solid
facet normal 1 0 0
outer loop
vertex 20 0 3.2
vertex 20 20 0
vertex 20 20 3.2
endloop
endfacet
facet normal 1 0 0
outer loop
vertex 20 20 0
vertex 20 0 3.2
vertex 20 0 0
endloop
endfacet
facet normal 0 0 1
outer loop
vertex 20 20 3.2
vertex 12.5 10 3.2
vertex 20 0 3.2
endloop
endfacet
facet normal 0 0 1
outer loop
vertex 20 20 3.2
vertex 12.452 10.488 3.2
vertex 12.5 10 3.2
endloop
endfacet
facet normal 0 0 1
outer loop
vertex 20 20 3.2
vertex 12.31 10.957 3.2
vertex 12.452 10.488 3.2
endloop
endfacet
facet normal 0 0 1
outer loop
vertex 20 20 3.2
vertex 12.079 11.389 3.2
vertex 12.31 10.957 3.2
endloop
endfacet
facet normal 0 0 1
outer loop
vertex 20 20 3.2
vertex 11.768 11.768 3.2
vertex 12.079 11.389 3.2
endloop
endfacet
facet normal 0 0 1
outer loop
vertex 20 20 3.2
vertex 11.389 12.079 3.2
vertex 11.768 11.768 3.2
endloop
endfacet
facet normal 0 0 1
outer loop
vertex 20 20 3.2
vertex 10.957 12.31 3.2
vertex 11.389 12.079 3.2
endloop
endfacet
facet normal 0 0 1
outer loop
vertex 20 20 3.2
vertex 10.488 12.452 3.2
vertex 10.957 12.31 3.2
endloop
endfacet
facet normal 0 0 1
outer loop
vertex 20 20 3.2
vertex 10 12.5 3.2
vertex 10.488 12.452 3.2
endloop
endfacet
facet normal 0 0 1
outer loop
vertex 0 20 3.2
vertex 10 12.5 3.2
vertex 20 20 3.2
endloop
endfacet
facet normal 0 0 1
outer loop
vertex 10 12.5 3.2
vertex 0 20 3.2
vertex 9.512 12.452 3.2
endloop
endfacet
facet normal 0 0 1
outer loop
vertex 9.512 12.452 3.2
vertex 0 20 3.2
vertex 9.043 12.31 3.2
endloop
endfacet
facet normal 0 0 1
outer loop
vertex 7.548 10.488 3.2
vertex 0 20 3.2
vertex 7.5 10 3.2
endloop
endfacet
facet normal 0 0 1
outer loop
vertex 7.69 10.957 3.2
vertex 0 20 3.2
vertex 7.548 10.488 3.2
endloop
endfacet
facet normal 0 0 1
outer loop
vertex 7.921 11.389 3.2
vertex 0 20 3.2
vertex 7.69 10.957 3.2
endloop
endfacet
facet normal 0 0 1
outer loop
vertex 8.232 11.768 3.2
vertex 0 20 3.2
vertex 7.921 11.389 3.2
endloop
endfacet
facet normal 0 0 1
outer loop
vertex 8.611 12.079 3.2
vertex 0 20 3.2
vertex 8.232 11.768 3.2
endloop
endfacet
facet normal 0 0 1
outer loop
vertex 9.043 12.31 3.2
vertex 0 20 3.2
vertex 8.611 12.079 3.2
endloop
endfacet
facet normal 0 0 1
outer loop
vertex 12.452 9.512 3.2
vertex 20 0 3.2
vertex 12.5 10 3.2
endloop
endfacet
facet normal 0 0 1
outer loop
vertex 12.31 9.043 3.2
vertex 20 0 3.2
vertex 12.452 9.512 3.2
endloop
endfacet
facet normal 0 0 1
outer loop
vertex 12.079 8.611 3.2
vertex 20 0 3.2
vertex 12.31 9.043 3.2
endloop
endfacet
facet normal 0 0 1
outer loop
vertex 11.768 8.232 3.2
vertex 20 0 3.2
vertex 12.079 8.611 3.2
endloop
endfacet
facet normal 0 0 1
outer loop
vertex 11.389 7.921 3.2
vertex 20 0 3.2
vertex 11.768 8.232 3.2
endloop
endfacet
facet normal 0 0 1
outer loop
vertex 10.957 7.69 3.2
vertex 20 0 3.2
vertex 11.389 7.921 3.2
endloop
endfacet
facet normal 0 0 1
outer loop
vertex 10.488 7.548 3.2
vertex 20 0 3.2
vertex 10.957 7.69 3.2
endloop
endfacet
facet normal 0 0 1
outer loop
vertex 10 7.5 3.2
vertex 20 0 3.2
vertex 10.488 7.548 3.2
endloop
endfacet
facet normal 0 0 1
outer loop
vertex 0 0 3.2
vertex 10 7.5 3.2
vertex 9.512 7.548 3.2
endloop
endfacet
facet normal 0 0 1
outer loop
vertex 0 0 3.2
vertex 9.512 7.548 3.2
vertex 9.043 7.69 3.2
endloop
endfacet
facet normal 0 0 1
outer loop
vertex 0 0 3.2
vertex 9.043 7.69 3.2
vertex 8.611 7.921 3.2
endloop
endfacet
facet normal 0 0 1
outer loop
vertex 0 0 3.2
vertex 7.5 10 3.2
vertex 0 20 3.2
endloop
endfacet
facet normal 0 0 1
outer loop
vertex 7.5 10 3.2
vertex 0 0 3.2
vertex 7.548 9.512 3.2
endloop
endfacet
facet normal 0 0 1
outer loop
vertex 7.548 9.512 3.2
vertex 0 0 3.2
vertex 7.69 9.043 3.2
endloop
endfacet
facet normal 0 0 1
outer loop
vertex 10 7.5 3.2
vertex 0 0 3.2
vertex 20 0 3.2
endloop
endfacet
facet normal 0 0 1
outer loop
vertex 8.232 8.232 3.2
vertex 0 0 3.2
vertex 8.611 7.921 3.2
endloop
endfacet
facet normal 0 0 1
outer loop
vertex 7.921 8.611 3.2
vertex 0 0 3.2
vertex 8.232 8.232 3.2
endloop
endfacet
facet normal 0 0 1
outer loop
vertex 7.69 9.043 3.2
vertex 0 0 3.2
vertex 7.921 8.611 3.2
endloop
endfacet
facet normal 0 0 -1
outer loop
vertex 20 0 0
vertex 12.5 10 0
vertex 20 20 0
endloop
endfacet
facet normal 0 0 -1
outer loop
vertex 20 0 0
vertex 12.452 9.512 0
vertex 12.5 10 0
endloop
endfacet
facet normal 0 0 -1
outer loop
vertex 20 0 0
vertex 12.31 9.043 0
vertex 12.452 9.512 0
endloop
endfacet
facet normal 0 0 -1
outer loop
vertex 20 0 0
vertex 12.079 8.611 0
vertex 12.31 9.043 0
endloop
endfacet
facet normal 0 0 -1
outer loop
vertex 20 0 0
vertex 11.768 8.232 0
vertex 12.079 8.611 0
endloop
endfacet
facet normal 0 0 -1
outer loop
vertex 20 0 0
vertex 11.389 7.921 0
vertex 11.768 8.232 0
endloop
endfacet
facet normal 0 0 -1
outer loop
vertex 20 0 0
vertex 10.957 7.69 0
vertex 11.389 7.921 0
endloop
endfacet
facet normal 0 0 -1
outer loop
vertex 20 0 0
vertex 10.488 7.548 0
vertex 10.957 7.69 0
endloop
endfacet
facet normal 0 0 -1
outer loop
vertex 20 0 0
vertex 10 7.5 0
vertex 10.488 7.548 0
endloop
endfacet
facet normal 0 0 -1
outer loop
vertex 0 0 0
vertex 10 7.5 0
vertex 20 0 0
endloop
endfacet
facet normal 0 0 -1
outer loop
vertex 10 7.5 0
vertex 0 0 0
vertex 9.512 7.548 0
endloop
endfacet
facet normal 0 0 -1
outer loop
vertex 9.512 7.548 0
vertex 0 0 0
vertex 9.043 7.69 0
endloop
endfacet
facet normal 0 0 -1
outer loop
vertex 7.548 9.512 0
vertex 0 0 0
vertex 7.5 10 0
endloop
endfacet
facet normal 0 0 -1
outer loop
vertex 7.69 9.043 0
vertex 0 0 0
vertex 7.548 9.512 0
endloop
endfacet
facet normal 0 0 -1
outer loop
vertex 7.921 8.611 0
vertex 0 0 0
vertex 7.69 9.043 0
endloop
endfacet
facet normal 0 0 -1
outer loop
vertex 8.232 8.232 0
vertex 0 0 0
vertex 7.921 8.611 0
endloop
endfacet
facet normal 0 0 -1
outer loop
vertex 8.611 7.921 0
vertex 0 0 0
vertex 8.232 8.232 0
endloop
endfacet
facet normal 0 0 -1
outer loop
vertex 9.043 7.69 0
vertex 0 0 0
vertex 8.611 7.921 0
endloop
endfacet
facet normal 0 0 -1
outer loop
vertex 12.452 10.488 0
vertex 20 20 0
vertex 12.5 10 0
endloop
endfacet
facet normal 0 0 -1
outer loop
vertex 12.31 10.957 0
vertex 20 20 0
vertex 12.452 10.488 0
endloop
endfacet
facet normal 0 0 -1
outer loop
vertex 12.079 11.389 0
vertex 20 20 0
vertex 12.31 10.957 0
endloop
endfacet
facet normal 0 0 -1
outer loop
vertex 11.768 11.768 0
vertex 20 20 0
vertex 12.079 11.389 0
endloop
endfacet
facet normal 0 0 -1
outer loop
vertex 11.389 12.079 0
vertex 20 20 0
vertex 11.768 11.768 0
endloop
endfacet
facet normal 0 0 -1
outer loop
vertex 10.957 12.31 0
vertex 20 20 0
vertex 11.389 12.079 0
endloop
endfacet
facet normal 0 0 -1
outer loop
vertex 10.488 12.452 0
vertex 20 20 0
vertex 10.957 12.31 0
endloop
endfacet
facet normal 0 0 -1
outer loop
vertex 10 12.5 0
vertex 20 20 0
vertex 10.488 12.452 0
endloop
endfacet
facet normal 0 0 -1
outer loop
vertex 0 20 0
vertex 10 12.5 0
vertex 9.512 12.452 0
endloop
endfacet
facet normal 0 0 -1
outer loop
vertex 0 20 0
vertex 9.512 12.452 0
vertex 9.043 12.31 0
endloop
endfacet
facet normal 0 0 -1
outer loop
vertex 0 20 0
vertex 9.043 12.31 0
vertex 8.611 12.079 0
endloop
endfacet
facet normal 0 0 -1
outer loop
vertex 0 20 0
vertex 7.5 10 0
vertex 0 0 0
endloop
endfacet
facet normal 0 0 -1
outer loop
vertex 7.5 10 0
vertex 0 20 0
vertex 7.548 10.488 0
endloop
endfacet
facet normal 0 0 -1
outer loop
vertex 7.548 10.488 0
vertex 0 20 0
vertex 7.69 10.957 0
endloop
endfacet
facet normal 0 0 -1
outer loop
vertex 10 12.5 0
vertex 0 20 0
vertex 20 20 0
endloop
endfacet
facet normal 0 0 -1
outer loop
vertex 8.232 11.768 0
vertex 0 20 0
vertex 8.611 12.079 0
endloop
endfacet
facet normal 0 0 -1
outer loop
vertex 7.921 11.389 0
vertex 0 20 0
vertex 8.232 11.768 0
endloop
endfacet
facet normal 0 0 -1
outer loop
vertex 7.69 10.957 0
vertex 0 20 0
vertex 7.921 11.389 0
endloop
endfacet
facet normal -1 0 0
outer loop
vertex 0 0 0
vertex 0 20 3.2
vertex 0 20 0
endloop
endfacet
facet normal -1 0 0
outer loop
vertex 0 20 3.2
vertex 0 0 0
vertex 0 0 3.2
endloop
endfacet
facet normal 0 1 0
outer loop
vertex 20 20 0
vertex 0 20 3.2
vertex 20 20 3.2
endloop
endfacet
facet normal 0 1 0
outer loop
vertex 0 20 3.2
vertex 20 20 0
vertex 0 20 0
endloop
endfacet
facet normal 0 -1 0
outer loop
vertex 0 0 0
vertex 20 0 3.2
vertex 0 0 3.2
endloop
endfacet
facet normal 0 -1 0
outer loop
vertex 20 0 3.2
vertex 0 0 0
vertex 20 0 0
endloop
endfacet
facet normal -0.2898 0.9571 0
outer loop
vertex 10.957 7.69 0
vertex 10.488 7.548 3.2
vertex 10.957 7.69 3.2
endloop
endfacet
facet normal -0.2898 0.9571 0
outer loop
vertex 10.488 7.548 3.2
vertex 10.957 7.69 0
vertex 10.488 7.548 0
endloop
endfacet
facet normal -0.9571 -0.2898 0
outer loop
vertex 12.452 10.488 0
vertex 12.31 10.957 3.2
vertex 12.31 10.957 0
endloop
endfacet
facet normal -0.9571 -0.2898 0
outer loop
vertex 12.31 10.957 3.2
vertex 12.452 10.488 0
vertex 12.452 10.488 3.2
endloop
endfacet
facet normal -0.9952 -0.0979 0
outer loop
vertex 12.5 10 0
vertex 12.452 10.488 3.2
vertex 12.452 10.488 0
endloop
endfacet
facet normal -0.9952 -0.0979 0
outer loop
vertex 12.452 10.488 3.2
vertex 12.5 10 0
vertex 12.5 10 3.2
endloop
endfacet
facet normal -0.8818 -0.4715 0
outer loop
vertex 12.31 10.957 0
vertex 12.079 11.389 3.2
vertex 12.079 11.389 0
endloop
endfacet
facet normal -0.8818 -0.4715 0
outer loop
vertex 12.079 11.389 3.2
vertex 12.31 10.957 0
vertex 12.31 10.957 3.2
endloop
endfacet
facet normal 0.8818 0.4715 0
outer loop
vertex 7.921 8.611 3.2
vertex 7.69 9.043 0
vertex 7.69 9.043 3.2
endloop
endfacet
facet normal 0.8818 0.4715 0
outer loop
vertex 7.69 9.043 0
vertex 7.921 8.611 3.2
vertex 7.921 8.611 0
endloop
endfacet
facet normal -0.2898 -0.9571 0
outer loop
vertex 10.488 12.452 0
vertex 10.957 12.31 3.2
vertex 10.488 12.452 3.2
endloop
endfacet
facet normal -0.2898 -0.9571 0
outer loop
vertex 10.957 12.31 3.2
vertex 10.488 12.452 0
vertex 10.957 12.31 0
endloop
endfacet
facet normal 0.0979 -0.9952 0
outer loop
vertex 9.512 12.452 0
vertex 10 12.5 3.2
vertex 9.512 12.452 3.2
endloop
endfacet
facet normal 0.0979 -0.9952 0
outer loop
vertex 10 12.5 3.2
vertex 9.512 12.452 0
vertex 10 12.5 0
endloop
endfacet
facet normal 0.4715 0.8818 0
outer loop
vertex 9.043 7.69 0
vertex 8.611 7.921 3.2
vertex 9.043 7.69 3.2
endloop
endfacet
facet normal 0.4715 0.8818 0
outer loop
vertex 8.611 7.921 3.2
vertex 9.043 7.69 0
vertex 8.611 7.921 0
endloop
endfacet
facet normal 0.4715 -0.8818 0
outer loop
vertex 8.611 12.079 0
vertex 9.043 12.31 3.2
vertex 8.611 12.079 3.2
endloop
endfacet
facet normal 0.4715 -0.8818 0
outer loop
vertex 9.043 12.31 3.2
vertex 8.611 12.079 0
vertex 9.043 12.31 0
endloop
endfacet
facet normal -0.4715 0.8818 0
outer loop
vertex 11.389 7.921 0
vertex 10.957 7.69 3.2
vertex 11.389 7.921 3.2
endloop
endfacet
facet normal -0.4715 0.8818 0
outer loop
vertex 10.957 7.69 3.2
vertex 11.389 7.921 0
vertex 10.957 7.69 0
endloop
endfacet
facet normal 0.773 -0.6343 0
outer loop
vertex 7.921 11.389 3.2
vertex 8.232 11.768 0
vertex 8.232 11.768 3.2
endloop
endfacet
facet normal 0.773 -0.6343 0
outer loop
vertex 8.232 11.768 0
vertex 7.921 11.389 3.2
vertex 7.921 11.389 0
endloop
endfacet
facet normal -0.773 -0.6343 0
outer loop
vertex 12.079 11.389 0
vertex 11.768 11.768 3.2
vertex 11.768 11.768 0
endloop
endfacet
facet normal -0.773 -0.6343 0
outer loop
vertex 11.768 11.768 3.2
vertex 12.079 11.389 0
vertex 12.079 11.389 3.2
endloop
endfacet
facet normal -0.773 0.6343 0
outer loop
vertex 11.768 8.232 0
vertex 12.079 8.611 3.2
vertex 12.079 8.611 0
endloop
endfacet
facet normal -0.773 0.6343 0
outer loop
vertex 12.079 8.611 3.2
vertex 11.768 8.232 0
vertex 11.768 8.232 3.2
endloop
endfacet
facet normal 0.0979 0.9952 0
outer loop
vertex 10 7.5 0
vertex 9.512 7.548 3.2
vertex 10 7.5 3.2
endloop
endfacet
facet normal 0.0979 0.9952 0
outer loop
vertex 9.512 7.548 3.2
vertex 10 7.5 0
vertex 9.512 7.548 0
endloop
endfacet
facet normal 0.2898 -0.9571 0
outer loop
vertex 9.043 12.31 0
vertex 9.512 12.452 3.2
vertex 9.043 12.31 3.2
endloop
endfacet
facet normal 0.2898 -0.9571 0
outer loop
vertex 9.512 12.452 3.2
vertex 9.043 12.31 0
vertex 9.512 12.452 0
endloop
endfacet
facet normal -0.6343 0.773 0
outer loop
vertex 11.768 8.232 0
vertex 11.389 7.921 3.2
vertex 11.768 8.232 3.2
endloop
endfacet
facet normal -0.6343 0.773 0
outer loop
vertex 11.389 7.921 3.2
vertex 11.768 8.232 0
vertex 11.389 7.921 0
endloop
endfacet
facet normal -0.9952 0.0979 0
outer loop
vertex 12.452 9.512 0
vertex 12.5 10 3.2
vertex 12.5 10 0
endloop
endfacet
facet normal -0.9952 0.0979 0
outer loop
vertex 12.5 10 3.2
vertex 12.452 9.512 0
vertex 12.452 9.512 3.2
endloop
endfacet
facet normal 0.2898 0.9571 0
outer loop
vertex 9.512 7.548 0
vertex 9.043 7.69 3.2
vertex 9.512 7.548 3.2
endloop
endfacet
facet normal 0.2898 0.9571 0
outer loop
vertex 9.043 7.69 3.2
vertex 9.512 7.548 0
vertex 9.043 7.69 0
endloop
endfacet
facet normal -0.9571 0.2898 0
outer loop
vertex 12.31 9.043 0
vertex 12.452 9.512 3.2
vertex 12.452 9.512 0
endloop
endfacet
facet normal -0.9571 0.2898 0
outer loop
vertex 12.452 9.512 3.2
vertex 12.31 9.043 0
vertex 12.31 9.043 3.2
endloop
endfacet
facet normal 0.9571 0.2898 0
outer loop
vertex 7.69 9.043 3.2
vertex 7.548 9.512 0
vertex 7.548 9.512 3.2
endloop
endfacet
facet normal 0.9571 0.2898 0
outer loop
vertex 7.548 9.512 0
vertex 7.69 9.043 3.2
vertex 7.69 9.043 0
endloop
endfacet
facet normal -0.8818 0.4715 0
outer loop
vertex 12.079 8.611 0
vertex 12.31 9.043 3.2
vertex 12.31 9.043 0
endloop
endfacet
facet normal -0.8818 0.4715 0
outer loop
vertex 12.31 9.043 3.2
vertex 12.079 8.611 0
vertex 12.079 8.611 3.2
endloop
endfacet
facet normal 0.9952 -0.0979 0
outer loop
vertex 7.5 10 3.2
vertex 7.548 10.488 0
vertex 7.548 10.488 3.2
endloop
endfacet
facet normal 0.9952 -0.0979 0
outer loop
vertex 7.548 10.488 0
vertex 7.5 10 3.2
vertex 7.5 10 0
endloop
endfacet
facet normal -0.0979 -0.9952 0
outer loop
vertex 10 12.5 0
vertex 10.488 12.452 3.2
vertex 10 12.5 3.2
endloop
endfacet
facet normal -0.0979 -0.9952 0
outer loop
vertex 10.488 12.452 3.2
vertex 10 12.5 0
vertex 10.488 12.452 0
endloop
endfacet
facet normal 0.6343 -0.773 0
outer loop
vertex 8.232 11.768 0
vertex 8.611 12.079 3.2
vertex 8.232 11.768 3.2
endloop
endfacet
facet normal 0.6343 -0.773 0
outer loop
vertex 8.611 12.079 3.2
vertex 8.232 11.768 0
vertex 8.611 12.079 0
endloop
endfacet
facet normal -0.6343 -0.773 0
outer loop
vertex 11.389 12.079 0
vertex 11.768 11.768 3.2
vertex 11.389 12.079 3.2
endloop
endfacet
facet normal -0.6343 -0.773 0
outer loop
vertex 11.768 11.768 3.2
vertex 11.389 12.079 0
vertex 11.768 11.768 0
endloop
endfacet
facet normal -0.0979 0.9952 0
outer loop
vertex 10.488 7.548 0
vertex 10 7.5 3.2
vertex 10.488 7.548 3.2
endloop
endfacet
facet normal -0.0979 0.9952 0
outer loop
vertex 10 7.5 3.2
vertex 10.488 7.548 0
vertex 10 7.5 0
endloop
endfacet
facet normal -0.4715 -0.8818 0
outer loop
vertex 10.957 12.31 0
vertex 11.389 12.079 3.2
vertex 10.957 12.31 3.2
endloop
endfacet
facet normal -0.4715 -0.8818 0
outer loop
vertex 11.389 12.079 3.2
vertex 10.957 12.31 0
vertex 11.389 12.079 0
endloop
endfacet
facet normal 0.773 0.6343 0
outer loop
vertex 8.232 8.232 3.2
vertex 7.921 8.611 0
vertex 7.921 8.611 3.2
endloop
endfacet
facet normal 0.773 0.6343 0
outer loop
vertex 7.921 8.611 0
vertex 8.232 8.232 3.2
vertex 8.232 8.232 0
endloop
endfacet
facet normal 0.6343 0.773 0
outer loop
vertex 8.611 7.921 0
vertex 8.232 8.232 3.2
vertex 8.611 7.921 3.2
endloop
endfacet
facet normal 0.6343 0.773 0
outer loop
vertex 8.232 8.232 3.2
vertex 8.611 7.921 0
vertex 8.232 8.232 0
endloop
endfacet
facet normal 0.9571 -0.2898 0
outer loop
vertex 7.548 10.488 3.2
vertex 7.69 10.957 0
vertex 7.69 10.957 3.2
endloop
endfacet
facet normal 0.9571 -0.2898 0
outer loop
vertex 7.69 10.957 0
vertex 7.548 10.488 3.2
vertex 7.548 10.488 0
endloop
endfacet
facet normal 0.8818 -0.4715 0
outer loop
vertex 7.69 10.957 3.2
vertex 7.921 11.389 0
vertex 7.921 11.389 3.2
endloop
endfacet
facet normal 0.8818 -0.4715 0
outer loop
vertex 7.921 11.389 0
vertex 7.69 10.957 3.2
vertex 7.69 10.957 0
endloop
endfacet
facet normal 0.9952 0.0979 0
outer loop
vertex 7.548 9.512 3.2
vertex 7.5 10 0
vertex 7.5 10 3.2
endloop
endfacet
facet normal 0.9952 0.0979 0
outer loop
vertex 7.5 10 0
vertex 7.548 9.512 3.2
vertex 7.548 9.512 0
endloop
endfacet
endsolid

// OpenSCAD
// Fit coupon — millimetres. Named parameters must match PRINT_SPEC.yaml.
// One small body, expected_shells = 1. Copy to project fit/<name>-coupon.scad.

hole_d = 4.2;
clearance_per_side_mm = 0.4;
coupon_size_mm = 20;
coupon_z_mm = 3.2;
$fn = 32;
eps = 0.02;

difference() {
  cube([coupon_size_mm, coupon_size_mm, coupon_z_mm]);
  translate([coupon_size_mm / 2, coupon_size_mm / 2, -eps])
    cylinder(d = hole_d + 2 * clearance_per_side_mm, h = coupon_z_mm + 2 * eps);
}
